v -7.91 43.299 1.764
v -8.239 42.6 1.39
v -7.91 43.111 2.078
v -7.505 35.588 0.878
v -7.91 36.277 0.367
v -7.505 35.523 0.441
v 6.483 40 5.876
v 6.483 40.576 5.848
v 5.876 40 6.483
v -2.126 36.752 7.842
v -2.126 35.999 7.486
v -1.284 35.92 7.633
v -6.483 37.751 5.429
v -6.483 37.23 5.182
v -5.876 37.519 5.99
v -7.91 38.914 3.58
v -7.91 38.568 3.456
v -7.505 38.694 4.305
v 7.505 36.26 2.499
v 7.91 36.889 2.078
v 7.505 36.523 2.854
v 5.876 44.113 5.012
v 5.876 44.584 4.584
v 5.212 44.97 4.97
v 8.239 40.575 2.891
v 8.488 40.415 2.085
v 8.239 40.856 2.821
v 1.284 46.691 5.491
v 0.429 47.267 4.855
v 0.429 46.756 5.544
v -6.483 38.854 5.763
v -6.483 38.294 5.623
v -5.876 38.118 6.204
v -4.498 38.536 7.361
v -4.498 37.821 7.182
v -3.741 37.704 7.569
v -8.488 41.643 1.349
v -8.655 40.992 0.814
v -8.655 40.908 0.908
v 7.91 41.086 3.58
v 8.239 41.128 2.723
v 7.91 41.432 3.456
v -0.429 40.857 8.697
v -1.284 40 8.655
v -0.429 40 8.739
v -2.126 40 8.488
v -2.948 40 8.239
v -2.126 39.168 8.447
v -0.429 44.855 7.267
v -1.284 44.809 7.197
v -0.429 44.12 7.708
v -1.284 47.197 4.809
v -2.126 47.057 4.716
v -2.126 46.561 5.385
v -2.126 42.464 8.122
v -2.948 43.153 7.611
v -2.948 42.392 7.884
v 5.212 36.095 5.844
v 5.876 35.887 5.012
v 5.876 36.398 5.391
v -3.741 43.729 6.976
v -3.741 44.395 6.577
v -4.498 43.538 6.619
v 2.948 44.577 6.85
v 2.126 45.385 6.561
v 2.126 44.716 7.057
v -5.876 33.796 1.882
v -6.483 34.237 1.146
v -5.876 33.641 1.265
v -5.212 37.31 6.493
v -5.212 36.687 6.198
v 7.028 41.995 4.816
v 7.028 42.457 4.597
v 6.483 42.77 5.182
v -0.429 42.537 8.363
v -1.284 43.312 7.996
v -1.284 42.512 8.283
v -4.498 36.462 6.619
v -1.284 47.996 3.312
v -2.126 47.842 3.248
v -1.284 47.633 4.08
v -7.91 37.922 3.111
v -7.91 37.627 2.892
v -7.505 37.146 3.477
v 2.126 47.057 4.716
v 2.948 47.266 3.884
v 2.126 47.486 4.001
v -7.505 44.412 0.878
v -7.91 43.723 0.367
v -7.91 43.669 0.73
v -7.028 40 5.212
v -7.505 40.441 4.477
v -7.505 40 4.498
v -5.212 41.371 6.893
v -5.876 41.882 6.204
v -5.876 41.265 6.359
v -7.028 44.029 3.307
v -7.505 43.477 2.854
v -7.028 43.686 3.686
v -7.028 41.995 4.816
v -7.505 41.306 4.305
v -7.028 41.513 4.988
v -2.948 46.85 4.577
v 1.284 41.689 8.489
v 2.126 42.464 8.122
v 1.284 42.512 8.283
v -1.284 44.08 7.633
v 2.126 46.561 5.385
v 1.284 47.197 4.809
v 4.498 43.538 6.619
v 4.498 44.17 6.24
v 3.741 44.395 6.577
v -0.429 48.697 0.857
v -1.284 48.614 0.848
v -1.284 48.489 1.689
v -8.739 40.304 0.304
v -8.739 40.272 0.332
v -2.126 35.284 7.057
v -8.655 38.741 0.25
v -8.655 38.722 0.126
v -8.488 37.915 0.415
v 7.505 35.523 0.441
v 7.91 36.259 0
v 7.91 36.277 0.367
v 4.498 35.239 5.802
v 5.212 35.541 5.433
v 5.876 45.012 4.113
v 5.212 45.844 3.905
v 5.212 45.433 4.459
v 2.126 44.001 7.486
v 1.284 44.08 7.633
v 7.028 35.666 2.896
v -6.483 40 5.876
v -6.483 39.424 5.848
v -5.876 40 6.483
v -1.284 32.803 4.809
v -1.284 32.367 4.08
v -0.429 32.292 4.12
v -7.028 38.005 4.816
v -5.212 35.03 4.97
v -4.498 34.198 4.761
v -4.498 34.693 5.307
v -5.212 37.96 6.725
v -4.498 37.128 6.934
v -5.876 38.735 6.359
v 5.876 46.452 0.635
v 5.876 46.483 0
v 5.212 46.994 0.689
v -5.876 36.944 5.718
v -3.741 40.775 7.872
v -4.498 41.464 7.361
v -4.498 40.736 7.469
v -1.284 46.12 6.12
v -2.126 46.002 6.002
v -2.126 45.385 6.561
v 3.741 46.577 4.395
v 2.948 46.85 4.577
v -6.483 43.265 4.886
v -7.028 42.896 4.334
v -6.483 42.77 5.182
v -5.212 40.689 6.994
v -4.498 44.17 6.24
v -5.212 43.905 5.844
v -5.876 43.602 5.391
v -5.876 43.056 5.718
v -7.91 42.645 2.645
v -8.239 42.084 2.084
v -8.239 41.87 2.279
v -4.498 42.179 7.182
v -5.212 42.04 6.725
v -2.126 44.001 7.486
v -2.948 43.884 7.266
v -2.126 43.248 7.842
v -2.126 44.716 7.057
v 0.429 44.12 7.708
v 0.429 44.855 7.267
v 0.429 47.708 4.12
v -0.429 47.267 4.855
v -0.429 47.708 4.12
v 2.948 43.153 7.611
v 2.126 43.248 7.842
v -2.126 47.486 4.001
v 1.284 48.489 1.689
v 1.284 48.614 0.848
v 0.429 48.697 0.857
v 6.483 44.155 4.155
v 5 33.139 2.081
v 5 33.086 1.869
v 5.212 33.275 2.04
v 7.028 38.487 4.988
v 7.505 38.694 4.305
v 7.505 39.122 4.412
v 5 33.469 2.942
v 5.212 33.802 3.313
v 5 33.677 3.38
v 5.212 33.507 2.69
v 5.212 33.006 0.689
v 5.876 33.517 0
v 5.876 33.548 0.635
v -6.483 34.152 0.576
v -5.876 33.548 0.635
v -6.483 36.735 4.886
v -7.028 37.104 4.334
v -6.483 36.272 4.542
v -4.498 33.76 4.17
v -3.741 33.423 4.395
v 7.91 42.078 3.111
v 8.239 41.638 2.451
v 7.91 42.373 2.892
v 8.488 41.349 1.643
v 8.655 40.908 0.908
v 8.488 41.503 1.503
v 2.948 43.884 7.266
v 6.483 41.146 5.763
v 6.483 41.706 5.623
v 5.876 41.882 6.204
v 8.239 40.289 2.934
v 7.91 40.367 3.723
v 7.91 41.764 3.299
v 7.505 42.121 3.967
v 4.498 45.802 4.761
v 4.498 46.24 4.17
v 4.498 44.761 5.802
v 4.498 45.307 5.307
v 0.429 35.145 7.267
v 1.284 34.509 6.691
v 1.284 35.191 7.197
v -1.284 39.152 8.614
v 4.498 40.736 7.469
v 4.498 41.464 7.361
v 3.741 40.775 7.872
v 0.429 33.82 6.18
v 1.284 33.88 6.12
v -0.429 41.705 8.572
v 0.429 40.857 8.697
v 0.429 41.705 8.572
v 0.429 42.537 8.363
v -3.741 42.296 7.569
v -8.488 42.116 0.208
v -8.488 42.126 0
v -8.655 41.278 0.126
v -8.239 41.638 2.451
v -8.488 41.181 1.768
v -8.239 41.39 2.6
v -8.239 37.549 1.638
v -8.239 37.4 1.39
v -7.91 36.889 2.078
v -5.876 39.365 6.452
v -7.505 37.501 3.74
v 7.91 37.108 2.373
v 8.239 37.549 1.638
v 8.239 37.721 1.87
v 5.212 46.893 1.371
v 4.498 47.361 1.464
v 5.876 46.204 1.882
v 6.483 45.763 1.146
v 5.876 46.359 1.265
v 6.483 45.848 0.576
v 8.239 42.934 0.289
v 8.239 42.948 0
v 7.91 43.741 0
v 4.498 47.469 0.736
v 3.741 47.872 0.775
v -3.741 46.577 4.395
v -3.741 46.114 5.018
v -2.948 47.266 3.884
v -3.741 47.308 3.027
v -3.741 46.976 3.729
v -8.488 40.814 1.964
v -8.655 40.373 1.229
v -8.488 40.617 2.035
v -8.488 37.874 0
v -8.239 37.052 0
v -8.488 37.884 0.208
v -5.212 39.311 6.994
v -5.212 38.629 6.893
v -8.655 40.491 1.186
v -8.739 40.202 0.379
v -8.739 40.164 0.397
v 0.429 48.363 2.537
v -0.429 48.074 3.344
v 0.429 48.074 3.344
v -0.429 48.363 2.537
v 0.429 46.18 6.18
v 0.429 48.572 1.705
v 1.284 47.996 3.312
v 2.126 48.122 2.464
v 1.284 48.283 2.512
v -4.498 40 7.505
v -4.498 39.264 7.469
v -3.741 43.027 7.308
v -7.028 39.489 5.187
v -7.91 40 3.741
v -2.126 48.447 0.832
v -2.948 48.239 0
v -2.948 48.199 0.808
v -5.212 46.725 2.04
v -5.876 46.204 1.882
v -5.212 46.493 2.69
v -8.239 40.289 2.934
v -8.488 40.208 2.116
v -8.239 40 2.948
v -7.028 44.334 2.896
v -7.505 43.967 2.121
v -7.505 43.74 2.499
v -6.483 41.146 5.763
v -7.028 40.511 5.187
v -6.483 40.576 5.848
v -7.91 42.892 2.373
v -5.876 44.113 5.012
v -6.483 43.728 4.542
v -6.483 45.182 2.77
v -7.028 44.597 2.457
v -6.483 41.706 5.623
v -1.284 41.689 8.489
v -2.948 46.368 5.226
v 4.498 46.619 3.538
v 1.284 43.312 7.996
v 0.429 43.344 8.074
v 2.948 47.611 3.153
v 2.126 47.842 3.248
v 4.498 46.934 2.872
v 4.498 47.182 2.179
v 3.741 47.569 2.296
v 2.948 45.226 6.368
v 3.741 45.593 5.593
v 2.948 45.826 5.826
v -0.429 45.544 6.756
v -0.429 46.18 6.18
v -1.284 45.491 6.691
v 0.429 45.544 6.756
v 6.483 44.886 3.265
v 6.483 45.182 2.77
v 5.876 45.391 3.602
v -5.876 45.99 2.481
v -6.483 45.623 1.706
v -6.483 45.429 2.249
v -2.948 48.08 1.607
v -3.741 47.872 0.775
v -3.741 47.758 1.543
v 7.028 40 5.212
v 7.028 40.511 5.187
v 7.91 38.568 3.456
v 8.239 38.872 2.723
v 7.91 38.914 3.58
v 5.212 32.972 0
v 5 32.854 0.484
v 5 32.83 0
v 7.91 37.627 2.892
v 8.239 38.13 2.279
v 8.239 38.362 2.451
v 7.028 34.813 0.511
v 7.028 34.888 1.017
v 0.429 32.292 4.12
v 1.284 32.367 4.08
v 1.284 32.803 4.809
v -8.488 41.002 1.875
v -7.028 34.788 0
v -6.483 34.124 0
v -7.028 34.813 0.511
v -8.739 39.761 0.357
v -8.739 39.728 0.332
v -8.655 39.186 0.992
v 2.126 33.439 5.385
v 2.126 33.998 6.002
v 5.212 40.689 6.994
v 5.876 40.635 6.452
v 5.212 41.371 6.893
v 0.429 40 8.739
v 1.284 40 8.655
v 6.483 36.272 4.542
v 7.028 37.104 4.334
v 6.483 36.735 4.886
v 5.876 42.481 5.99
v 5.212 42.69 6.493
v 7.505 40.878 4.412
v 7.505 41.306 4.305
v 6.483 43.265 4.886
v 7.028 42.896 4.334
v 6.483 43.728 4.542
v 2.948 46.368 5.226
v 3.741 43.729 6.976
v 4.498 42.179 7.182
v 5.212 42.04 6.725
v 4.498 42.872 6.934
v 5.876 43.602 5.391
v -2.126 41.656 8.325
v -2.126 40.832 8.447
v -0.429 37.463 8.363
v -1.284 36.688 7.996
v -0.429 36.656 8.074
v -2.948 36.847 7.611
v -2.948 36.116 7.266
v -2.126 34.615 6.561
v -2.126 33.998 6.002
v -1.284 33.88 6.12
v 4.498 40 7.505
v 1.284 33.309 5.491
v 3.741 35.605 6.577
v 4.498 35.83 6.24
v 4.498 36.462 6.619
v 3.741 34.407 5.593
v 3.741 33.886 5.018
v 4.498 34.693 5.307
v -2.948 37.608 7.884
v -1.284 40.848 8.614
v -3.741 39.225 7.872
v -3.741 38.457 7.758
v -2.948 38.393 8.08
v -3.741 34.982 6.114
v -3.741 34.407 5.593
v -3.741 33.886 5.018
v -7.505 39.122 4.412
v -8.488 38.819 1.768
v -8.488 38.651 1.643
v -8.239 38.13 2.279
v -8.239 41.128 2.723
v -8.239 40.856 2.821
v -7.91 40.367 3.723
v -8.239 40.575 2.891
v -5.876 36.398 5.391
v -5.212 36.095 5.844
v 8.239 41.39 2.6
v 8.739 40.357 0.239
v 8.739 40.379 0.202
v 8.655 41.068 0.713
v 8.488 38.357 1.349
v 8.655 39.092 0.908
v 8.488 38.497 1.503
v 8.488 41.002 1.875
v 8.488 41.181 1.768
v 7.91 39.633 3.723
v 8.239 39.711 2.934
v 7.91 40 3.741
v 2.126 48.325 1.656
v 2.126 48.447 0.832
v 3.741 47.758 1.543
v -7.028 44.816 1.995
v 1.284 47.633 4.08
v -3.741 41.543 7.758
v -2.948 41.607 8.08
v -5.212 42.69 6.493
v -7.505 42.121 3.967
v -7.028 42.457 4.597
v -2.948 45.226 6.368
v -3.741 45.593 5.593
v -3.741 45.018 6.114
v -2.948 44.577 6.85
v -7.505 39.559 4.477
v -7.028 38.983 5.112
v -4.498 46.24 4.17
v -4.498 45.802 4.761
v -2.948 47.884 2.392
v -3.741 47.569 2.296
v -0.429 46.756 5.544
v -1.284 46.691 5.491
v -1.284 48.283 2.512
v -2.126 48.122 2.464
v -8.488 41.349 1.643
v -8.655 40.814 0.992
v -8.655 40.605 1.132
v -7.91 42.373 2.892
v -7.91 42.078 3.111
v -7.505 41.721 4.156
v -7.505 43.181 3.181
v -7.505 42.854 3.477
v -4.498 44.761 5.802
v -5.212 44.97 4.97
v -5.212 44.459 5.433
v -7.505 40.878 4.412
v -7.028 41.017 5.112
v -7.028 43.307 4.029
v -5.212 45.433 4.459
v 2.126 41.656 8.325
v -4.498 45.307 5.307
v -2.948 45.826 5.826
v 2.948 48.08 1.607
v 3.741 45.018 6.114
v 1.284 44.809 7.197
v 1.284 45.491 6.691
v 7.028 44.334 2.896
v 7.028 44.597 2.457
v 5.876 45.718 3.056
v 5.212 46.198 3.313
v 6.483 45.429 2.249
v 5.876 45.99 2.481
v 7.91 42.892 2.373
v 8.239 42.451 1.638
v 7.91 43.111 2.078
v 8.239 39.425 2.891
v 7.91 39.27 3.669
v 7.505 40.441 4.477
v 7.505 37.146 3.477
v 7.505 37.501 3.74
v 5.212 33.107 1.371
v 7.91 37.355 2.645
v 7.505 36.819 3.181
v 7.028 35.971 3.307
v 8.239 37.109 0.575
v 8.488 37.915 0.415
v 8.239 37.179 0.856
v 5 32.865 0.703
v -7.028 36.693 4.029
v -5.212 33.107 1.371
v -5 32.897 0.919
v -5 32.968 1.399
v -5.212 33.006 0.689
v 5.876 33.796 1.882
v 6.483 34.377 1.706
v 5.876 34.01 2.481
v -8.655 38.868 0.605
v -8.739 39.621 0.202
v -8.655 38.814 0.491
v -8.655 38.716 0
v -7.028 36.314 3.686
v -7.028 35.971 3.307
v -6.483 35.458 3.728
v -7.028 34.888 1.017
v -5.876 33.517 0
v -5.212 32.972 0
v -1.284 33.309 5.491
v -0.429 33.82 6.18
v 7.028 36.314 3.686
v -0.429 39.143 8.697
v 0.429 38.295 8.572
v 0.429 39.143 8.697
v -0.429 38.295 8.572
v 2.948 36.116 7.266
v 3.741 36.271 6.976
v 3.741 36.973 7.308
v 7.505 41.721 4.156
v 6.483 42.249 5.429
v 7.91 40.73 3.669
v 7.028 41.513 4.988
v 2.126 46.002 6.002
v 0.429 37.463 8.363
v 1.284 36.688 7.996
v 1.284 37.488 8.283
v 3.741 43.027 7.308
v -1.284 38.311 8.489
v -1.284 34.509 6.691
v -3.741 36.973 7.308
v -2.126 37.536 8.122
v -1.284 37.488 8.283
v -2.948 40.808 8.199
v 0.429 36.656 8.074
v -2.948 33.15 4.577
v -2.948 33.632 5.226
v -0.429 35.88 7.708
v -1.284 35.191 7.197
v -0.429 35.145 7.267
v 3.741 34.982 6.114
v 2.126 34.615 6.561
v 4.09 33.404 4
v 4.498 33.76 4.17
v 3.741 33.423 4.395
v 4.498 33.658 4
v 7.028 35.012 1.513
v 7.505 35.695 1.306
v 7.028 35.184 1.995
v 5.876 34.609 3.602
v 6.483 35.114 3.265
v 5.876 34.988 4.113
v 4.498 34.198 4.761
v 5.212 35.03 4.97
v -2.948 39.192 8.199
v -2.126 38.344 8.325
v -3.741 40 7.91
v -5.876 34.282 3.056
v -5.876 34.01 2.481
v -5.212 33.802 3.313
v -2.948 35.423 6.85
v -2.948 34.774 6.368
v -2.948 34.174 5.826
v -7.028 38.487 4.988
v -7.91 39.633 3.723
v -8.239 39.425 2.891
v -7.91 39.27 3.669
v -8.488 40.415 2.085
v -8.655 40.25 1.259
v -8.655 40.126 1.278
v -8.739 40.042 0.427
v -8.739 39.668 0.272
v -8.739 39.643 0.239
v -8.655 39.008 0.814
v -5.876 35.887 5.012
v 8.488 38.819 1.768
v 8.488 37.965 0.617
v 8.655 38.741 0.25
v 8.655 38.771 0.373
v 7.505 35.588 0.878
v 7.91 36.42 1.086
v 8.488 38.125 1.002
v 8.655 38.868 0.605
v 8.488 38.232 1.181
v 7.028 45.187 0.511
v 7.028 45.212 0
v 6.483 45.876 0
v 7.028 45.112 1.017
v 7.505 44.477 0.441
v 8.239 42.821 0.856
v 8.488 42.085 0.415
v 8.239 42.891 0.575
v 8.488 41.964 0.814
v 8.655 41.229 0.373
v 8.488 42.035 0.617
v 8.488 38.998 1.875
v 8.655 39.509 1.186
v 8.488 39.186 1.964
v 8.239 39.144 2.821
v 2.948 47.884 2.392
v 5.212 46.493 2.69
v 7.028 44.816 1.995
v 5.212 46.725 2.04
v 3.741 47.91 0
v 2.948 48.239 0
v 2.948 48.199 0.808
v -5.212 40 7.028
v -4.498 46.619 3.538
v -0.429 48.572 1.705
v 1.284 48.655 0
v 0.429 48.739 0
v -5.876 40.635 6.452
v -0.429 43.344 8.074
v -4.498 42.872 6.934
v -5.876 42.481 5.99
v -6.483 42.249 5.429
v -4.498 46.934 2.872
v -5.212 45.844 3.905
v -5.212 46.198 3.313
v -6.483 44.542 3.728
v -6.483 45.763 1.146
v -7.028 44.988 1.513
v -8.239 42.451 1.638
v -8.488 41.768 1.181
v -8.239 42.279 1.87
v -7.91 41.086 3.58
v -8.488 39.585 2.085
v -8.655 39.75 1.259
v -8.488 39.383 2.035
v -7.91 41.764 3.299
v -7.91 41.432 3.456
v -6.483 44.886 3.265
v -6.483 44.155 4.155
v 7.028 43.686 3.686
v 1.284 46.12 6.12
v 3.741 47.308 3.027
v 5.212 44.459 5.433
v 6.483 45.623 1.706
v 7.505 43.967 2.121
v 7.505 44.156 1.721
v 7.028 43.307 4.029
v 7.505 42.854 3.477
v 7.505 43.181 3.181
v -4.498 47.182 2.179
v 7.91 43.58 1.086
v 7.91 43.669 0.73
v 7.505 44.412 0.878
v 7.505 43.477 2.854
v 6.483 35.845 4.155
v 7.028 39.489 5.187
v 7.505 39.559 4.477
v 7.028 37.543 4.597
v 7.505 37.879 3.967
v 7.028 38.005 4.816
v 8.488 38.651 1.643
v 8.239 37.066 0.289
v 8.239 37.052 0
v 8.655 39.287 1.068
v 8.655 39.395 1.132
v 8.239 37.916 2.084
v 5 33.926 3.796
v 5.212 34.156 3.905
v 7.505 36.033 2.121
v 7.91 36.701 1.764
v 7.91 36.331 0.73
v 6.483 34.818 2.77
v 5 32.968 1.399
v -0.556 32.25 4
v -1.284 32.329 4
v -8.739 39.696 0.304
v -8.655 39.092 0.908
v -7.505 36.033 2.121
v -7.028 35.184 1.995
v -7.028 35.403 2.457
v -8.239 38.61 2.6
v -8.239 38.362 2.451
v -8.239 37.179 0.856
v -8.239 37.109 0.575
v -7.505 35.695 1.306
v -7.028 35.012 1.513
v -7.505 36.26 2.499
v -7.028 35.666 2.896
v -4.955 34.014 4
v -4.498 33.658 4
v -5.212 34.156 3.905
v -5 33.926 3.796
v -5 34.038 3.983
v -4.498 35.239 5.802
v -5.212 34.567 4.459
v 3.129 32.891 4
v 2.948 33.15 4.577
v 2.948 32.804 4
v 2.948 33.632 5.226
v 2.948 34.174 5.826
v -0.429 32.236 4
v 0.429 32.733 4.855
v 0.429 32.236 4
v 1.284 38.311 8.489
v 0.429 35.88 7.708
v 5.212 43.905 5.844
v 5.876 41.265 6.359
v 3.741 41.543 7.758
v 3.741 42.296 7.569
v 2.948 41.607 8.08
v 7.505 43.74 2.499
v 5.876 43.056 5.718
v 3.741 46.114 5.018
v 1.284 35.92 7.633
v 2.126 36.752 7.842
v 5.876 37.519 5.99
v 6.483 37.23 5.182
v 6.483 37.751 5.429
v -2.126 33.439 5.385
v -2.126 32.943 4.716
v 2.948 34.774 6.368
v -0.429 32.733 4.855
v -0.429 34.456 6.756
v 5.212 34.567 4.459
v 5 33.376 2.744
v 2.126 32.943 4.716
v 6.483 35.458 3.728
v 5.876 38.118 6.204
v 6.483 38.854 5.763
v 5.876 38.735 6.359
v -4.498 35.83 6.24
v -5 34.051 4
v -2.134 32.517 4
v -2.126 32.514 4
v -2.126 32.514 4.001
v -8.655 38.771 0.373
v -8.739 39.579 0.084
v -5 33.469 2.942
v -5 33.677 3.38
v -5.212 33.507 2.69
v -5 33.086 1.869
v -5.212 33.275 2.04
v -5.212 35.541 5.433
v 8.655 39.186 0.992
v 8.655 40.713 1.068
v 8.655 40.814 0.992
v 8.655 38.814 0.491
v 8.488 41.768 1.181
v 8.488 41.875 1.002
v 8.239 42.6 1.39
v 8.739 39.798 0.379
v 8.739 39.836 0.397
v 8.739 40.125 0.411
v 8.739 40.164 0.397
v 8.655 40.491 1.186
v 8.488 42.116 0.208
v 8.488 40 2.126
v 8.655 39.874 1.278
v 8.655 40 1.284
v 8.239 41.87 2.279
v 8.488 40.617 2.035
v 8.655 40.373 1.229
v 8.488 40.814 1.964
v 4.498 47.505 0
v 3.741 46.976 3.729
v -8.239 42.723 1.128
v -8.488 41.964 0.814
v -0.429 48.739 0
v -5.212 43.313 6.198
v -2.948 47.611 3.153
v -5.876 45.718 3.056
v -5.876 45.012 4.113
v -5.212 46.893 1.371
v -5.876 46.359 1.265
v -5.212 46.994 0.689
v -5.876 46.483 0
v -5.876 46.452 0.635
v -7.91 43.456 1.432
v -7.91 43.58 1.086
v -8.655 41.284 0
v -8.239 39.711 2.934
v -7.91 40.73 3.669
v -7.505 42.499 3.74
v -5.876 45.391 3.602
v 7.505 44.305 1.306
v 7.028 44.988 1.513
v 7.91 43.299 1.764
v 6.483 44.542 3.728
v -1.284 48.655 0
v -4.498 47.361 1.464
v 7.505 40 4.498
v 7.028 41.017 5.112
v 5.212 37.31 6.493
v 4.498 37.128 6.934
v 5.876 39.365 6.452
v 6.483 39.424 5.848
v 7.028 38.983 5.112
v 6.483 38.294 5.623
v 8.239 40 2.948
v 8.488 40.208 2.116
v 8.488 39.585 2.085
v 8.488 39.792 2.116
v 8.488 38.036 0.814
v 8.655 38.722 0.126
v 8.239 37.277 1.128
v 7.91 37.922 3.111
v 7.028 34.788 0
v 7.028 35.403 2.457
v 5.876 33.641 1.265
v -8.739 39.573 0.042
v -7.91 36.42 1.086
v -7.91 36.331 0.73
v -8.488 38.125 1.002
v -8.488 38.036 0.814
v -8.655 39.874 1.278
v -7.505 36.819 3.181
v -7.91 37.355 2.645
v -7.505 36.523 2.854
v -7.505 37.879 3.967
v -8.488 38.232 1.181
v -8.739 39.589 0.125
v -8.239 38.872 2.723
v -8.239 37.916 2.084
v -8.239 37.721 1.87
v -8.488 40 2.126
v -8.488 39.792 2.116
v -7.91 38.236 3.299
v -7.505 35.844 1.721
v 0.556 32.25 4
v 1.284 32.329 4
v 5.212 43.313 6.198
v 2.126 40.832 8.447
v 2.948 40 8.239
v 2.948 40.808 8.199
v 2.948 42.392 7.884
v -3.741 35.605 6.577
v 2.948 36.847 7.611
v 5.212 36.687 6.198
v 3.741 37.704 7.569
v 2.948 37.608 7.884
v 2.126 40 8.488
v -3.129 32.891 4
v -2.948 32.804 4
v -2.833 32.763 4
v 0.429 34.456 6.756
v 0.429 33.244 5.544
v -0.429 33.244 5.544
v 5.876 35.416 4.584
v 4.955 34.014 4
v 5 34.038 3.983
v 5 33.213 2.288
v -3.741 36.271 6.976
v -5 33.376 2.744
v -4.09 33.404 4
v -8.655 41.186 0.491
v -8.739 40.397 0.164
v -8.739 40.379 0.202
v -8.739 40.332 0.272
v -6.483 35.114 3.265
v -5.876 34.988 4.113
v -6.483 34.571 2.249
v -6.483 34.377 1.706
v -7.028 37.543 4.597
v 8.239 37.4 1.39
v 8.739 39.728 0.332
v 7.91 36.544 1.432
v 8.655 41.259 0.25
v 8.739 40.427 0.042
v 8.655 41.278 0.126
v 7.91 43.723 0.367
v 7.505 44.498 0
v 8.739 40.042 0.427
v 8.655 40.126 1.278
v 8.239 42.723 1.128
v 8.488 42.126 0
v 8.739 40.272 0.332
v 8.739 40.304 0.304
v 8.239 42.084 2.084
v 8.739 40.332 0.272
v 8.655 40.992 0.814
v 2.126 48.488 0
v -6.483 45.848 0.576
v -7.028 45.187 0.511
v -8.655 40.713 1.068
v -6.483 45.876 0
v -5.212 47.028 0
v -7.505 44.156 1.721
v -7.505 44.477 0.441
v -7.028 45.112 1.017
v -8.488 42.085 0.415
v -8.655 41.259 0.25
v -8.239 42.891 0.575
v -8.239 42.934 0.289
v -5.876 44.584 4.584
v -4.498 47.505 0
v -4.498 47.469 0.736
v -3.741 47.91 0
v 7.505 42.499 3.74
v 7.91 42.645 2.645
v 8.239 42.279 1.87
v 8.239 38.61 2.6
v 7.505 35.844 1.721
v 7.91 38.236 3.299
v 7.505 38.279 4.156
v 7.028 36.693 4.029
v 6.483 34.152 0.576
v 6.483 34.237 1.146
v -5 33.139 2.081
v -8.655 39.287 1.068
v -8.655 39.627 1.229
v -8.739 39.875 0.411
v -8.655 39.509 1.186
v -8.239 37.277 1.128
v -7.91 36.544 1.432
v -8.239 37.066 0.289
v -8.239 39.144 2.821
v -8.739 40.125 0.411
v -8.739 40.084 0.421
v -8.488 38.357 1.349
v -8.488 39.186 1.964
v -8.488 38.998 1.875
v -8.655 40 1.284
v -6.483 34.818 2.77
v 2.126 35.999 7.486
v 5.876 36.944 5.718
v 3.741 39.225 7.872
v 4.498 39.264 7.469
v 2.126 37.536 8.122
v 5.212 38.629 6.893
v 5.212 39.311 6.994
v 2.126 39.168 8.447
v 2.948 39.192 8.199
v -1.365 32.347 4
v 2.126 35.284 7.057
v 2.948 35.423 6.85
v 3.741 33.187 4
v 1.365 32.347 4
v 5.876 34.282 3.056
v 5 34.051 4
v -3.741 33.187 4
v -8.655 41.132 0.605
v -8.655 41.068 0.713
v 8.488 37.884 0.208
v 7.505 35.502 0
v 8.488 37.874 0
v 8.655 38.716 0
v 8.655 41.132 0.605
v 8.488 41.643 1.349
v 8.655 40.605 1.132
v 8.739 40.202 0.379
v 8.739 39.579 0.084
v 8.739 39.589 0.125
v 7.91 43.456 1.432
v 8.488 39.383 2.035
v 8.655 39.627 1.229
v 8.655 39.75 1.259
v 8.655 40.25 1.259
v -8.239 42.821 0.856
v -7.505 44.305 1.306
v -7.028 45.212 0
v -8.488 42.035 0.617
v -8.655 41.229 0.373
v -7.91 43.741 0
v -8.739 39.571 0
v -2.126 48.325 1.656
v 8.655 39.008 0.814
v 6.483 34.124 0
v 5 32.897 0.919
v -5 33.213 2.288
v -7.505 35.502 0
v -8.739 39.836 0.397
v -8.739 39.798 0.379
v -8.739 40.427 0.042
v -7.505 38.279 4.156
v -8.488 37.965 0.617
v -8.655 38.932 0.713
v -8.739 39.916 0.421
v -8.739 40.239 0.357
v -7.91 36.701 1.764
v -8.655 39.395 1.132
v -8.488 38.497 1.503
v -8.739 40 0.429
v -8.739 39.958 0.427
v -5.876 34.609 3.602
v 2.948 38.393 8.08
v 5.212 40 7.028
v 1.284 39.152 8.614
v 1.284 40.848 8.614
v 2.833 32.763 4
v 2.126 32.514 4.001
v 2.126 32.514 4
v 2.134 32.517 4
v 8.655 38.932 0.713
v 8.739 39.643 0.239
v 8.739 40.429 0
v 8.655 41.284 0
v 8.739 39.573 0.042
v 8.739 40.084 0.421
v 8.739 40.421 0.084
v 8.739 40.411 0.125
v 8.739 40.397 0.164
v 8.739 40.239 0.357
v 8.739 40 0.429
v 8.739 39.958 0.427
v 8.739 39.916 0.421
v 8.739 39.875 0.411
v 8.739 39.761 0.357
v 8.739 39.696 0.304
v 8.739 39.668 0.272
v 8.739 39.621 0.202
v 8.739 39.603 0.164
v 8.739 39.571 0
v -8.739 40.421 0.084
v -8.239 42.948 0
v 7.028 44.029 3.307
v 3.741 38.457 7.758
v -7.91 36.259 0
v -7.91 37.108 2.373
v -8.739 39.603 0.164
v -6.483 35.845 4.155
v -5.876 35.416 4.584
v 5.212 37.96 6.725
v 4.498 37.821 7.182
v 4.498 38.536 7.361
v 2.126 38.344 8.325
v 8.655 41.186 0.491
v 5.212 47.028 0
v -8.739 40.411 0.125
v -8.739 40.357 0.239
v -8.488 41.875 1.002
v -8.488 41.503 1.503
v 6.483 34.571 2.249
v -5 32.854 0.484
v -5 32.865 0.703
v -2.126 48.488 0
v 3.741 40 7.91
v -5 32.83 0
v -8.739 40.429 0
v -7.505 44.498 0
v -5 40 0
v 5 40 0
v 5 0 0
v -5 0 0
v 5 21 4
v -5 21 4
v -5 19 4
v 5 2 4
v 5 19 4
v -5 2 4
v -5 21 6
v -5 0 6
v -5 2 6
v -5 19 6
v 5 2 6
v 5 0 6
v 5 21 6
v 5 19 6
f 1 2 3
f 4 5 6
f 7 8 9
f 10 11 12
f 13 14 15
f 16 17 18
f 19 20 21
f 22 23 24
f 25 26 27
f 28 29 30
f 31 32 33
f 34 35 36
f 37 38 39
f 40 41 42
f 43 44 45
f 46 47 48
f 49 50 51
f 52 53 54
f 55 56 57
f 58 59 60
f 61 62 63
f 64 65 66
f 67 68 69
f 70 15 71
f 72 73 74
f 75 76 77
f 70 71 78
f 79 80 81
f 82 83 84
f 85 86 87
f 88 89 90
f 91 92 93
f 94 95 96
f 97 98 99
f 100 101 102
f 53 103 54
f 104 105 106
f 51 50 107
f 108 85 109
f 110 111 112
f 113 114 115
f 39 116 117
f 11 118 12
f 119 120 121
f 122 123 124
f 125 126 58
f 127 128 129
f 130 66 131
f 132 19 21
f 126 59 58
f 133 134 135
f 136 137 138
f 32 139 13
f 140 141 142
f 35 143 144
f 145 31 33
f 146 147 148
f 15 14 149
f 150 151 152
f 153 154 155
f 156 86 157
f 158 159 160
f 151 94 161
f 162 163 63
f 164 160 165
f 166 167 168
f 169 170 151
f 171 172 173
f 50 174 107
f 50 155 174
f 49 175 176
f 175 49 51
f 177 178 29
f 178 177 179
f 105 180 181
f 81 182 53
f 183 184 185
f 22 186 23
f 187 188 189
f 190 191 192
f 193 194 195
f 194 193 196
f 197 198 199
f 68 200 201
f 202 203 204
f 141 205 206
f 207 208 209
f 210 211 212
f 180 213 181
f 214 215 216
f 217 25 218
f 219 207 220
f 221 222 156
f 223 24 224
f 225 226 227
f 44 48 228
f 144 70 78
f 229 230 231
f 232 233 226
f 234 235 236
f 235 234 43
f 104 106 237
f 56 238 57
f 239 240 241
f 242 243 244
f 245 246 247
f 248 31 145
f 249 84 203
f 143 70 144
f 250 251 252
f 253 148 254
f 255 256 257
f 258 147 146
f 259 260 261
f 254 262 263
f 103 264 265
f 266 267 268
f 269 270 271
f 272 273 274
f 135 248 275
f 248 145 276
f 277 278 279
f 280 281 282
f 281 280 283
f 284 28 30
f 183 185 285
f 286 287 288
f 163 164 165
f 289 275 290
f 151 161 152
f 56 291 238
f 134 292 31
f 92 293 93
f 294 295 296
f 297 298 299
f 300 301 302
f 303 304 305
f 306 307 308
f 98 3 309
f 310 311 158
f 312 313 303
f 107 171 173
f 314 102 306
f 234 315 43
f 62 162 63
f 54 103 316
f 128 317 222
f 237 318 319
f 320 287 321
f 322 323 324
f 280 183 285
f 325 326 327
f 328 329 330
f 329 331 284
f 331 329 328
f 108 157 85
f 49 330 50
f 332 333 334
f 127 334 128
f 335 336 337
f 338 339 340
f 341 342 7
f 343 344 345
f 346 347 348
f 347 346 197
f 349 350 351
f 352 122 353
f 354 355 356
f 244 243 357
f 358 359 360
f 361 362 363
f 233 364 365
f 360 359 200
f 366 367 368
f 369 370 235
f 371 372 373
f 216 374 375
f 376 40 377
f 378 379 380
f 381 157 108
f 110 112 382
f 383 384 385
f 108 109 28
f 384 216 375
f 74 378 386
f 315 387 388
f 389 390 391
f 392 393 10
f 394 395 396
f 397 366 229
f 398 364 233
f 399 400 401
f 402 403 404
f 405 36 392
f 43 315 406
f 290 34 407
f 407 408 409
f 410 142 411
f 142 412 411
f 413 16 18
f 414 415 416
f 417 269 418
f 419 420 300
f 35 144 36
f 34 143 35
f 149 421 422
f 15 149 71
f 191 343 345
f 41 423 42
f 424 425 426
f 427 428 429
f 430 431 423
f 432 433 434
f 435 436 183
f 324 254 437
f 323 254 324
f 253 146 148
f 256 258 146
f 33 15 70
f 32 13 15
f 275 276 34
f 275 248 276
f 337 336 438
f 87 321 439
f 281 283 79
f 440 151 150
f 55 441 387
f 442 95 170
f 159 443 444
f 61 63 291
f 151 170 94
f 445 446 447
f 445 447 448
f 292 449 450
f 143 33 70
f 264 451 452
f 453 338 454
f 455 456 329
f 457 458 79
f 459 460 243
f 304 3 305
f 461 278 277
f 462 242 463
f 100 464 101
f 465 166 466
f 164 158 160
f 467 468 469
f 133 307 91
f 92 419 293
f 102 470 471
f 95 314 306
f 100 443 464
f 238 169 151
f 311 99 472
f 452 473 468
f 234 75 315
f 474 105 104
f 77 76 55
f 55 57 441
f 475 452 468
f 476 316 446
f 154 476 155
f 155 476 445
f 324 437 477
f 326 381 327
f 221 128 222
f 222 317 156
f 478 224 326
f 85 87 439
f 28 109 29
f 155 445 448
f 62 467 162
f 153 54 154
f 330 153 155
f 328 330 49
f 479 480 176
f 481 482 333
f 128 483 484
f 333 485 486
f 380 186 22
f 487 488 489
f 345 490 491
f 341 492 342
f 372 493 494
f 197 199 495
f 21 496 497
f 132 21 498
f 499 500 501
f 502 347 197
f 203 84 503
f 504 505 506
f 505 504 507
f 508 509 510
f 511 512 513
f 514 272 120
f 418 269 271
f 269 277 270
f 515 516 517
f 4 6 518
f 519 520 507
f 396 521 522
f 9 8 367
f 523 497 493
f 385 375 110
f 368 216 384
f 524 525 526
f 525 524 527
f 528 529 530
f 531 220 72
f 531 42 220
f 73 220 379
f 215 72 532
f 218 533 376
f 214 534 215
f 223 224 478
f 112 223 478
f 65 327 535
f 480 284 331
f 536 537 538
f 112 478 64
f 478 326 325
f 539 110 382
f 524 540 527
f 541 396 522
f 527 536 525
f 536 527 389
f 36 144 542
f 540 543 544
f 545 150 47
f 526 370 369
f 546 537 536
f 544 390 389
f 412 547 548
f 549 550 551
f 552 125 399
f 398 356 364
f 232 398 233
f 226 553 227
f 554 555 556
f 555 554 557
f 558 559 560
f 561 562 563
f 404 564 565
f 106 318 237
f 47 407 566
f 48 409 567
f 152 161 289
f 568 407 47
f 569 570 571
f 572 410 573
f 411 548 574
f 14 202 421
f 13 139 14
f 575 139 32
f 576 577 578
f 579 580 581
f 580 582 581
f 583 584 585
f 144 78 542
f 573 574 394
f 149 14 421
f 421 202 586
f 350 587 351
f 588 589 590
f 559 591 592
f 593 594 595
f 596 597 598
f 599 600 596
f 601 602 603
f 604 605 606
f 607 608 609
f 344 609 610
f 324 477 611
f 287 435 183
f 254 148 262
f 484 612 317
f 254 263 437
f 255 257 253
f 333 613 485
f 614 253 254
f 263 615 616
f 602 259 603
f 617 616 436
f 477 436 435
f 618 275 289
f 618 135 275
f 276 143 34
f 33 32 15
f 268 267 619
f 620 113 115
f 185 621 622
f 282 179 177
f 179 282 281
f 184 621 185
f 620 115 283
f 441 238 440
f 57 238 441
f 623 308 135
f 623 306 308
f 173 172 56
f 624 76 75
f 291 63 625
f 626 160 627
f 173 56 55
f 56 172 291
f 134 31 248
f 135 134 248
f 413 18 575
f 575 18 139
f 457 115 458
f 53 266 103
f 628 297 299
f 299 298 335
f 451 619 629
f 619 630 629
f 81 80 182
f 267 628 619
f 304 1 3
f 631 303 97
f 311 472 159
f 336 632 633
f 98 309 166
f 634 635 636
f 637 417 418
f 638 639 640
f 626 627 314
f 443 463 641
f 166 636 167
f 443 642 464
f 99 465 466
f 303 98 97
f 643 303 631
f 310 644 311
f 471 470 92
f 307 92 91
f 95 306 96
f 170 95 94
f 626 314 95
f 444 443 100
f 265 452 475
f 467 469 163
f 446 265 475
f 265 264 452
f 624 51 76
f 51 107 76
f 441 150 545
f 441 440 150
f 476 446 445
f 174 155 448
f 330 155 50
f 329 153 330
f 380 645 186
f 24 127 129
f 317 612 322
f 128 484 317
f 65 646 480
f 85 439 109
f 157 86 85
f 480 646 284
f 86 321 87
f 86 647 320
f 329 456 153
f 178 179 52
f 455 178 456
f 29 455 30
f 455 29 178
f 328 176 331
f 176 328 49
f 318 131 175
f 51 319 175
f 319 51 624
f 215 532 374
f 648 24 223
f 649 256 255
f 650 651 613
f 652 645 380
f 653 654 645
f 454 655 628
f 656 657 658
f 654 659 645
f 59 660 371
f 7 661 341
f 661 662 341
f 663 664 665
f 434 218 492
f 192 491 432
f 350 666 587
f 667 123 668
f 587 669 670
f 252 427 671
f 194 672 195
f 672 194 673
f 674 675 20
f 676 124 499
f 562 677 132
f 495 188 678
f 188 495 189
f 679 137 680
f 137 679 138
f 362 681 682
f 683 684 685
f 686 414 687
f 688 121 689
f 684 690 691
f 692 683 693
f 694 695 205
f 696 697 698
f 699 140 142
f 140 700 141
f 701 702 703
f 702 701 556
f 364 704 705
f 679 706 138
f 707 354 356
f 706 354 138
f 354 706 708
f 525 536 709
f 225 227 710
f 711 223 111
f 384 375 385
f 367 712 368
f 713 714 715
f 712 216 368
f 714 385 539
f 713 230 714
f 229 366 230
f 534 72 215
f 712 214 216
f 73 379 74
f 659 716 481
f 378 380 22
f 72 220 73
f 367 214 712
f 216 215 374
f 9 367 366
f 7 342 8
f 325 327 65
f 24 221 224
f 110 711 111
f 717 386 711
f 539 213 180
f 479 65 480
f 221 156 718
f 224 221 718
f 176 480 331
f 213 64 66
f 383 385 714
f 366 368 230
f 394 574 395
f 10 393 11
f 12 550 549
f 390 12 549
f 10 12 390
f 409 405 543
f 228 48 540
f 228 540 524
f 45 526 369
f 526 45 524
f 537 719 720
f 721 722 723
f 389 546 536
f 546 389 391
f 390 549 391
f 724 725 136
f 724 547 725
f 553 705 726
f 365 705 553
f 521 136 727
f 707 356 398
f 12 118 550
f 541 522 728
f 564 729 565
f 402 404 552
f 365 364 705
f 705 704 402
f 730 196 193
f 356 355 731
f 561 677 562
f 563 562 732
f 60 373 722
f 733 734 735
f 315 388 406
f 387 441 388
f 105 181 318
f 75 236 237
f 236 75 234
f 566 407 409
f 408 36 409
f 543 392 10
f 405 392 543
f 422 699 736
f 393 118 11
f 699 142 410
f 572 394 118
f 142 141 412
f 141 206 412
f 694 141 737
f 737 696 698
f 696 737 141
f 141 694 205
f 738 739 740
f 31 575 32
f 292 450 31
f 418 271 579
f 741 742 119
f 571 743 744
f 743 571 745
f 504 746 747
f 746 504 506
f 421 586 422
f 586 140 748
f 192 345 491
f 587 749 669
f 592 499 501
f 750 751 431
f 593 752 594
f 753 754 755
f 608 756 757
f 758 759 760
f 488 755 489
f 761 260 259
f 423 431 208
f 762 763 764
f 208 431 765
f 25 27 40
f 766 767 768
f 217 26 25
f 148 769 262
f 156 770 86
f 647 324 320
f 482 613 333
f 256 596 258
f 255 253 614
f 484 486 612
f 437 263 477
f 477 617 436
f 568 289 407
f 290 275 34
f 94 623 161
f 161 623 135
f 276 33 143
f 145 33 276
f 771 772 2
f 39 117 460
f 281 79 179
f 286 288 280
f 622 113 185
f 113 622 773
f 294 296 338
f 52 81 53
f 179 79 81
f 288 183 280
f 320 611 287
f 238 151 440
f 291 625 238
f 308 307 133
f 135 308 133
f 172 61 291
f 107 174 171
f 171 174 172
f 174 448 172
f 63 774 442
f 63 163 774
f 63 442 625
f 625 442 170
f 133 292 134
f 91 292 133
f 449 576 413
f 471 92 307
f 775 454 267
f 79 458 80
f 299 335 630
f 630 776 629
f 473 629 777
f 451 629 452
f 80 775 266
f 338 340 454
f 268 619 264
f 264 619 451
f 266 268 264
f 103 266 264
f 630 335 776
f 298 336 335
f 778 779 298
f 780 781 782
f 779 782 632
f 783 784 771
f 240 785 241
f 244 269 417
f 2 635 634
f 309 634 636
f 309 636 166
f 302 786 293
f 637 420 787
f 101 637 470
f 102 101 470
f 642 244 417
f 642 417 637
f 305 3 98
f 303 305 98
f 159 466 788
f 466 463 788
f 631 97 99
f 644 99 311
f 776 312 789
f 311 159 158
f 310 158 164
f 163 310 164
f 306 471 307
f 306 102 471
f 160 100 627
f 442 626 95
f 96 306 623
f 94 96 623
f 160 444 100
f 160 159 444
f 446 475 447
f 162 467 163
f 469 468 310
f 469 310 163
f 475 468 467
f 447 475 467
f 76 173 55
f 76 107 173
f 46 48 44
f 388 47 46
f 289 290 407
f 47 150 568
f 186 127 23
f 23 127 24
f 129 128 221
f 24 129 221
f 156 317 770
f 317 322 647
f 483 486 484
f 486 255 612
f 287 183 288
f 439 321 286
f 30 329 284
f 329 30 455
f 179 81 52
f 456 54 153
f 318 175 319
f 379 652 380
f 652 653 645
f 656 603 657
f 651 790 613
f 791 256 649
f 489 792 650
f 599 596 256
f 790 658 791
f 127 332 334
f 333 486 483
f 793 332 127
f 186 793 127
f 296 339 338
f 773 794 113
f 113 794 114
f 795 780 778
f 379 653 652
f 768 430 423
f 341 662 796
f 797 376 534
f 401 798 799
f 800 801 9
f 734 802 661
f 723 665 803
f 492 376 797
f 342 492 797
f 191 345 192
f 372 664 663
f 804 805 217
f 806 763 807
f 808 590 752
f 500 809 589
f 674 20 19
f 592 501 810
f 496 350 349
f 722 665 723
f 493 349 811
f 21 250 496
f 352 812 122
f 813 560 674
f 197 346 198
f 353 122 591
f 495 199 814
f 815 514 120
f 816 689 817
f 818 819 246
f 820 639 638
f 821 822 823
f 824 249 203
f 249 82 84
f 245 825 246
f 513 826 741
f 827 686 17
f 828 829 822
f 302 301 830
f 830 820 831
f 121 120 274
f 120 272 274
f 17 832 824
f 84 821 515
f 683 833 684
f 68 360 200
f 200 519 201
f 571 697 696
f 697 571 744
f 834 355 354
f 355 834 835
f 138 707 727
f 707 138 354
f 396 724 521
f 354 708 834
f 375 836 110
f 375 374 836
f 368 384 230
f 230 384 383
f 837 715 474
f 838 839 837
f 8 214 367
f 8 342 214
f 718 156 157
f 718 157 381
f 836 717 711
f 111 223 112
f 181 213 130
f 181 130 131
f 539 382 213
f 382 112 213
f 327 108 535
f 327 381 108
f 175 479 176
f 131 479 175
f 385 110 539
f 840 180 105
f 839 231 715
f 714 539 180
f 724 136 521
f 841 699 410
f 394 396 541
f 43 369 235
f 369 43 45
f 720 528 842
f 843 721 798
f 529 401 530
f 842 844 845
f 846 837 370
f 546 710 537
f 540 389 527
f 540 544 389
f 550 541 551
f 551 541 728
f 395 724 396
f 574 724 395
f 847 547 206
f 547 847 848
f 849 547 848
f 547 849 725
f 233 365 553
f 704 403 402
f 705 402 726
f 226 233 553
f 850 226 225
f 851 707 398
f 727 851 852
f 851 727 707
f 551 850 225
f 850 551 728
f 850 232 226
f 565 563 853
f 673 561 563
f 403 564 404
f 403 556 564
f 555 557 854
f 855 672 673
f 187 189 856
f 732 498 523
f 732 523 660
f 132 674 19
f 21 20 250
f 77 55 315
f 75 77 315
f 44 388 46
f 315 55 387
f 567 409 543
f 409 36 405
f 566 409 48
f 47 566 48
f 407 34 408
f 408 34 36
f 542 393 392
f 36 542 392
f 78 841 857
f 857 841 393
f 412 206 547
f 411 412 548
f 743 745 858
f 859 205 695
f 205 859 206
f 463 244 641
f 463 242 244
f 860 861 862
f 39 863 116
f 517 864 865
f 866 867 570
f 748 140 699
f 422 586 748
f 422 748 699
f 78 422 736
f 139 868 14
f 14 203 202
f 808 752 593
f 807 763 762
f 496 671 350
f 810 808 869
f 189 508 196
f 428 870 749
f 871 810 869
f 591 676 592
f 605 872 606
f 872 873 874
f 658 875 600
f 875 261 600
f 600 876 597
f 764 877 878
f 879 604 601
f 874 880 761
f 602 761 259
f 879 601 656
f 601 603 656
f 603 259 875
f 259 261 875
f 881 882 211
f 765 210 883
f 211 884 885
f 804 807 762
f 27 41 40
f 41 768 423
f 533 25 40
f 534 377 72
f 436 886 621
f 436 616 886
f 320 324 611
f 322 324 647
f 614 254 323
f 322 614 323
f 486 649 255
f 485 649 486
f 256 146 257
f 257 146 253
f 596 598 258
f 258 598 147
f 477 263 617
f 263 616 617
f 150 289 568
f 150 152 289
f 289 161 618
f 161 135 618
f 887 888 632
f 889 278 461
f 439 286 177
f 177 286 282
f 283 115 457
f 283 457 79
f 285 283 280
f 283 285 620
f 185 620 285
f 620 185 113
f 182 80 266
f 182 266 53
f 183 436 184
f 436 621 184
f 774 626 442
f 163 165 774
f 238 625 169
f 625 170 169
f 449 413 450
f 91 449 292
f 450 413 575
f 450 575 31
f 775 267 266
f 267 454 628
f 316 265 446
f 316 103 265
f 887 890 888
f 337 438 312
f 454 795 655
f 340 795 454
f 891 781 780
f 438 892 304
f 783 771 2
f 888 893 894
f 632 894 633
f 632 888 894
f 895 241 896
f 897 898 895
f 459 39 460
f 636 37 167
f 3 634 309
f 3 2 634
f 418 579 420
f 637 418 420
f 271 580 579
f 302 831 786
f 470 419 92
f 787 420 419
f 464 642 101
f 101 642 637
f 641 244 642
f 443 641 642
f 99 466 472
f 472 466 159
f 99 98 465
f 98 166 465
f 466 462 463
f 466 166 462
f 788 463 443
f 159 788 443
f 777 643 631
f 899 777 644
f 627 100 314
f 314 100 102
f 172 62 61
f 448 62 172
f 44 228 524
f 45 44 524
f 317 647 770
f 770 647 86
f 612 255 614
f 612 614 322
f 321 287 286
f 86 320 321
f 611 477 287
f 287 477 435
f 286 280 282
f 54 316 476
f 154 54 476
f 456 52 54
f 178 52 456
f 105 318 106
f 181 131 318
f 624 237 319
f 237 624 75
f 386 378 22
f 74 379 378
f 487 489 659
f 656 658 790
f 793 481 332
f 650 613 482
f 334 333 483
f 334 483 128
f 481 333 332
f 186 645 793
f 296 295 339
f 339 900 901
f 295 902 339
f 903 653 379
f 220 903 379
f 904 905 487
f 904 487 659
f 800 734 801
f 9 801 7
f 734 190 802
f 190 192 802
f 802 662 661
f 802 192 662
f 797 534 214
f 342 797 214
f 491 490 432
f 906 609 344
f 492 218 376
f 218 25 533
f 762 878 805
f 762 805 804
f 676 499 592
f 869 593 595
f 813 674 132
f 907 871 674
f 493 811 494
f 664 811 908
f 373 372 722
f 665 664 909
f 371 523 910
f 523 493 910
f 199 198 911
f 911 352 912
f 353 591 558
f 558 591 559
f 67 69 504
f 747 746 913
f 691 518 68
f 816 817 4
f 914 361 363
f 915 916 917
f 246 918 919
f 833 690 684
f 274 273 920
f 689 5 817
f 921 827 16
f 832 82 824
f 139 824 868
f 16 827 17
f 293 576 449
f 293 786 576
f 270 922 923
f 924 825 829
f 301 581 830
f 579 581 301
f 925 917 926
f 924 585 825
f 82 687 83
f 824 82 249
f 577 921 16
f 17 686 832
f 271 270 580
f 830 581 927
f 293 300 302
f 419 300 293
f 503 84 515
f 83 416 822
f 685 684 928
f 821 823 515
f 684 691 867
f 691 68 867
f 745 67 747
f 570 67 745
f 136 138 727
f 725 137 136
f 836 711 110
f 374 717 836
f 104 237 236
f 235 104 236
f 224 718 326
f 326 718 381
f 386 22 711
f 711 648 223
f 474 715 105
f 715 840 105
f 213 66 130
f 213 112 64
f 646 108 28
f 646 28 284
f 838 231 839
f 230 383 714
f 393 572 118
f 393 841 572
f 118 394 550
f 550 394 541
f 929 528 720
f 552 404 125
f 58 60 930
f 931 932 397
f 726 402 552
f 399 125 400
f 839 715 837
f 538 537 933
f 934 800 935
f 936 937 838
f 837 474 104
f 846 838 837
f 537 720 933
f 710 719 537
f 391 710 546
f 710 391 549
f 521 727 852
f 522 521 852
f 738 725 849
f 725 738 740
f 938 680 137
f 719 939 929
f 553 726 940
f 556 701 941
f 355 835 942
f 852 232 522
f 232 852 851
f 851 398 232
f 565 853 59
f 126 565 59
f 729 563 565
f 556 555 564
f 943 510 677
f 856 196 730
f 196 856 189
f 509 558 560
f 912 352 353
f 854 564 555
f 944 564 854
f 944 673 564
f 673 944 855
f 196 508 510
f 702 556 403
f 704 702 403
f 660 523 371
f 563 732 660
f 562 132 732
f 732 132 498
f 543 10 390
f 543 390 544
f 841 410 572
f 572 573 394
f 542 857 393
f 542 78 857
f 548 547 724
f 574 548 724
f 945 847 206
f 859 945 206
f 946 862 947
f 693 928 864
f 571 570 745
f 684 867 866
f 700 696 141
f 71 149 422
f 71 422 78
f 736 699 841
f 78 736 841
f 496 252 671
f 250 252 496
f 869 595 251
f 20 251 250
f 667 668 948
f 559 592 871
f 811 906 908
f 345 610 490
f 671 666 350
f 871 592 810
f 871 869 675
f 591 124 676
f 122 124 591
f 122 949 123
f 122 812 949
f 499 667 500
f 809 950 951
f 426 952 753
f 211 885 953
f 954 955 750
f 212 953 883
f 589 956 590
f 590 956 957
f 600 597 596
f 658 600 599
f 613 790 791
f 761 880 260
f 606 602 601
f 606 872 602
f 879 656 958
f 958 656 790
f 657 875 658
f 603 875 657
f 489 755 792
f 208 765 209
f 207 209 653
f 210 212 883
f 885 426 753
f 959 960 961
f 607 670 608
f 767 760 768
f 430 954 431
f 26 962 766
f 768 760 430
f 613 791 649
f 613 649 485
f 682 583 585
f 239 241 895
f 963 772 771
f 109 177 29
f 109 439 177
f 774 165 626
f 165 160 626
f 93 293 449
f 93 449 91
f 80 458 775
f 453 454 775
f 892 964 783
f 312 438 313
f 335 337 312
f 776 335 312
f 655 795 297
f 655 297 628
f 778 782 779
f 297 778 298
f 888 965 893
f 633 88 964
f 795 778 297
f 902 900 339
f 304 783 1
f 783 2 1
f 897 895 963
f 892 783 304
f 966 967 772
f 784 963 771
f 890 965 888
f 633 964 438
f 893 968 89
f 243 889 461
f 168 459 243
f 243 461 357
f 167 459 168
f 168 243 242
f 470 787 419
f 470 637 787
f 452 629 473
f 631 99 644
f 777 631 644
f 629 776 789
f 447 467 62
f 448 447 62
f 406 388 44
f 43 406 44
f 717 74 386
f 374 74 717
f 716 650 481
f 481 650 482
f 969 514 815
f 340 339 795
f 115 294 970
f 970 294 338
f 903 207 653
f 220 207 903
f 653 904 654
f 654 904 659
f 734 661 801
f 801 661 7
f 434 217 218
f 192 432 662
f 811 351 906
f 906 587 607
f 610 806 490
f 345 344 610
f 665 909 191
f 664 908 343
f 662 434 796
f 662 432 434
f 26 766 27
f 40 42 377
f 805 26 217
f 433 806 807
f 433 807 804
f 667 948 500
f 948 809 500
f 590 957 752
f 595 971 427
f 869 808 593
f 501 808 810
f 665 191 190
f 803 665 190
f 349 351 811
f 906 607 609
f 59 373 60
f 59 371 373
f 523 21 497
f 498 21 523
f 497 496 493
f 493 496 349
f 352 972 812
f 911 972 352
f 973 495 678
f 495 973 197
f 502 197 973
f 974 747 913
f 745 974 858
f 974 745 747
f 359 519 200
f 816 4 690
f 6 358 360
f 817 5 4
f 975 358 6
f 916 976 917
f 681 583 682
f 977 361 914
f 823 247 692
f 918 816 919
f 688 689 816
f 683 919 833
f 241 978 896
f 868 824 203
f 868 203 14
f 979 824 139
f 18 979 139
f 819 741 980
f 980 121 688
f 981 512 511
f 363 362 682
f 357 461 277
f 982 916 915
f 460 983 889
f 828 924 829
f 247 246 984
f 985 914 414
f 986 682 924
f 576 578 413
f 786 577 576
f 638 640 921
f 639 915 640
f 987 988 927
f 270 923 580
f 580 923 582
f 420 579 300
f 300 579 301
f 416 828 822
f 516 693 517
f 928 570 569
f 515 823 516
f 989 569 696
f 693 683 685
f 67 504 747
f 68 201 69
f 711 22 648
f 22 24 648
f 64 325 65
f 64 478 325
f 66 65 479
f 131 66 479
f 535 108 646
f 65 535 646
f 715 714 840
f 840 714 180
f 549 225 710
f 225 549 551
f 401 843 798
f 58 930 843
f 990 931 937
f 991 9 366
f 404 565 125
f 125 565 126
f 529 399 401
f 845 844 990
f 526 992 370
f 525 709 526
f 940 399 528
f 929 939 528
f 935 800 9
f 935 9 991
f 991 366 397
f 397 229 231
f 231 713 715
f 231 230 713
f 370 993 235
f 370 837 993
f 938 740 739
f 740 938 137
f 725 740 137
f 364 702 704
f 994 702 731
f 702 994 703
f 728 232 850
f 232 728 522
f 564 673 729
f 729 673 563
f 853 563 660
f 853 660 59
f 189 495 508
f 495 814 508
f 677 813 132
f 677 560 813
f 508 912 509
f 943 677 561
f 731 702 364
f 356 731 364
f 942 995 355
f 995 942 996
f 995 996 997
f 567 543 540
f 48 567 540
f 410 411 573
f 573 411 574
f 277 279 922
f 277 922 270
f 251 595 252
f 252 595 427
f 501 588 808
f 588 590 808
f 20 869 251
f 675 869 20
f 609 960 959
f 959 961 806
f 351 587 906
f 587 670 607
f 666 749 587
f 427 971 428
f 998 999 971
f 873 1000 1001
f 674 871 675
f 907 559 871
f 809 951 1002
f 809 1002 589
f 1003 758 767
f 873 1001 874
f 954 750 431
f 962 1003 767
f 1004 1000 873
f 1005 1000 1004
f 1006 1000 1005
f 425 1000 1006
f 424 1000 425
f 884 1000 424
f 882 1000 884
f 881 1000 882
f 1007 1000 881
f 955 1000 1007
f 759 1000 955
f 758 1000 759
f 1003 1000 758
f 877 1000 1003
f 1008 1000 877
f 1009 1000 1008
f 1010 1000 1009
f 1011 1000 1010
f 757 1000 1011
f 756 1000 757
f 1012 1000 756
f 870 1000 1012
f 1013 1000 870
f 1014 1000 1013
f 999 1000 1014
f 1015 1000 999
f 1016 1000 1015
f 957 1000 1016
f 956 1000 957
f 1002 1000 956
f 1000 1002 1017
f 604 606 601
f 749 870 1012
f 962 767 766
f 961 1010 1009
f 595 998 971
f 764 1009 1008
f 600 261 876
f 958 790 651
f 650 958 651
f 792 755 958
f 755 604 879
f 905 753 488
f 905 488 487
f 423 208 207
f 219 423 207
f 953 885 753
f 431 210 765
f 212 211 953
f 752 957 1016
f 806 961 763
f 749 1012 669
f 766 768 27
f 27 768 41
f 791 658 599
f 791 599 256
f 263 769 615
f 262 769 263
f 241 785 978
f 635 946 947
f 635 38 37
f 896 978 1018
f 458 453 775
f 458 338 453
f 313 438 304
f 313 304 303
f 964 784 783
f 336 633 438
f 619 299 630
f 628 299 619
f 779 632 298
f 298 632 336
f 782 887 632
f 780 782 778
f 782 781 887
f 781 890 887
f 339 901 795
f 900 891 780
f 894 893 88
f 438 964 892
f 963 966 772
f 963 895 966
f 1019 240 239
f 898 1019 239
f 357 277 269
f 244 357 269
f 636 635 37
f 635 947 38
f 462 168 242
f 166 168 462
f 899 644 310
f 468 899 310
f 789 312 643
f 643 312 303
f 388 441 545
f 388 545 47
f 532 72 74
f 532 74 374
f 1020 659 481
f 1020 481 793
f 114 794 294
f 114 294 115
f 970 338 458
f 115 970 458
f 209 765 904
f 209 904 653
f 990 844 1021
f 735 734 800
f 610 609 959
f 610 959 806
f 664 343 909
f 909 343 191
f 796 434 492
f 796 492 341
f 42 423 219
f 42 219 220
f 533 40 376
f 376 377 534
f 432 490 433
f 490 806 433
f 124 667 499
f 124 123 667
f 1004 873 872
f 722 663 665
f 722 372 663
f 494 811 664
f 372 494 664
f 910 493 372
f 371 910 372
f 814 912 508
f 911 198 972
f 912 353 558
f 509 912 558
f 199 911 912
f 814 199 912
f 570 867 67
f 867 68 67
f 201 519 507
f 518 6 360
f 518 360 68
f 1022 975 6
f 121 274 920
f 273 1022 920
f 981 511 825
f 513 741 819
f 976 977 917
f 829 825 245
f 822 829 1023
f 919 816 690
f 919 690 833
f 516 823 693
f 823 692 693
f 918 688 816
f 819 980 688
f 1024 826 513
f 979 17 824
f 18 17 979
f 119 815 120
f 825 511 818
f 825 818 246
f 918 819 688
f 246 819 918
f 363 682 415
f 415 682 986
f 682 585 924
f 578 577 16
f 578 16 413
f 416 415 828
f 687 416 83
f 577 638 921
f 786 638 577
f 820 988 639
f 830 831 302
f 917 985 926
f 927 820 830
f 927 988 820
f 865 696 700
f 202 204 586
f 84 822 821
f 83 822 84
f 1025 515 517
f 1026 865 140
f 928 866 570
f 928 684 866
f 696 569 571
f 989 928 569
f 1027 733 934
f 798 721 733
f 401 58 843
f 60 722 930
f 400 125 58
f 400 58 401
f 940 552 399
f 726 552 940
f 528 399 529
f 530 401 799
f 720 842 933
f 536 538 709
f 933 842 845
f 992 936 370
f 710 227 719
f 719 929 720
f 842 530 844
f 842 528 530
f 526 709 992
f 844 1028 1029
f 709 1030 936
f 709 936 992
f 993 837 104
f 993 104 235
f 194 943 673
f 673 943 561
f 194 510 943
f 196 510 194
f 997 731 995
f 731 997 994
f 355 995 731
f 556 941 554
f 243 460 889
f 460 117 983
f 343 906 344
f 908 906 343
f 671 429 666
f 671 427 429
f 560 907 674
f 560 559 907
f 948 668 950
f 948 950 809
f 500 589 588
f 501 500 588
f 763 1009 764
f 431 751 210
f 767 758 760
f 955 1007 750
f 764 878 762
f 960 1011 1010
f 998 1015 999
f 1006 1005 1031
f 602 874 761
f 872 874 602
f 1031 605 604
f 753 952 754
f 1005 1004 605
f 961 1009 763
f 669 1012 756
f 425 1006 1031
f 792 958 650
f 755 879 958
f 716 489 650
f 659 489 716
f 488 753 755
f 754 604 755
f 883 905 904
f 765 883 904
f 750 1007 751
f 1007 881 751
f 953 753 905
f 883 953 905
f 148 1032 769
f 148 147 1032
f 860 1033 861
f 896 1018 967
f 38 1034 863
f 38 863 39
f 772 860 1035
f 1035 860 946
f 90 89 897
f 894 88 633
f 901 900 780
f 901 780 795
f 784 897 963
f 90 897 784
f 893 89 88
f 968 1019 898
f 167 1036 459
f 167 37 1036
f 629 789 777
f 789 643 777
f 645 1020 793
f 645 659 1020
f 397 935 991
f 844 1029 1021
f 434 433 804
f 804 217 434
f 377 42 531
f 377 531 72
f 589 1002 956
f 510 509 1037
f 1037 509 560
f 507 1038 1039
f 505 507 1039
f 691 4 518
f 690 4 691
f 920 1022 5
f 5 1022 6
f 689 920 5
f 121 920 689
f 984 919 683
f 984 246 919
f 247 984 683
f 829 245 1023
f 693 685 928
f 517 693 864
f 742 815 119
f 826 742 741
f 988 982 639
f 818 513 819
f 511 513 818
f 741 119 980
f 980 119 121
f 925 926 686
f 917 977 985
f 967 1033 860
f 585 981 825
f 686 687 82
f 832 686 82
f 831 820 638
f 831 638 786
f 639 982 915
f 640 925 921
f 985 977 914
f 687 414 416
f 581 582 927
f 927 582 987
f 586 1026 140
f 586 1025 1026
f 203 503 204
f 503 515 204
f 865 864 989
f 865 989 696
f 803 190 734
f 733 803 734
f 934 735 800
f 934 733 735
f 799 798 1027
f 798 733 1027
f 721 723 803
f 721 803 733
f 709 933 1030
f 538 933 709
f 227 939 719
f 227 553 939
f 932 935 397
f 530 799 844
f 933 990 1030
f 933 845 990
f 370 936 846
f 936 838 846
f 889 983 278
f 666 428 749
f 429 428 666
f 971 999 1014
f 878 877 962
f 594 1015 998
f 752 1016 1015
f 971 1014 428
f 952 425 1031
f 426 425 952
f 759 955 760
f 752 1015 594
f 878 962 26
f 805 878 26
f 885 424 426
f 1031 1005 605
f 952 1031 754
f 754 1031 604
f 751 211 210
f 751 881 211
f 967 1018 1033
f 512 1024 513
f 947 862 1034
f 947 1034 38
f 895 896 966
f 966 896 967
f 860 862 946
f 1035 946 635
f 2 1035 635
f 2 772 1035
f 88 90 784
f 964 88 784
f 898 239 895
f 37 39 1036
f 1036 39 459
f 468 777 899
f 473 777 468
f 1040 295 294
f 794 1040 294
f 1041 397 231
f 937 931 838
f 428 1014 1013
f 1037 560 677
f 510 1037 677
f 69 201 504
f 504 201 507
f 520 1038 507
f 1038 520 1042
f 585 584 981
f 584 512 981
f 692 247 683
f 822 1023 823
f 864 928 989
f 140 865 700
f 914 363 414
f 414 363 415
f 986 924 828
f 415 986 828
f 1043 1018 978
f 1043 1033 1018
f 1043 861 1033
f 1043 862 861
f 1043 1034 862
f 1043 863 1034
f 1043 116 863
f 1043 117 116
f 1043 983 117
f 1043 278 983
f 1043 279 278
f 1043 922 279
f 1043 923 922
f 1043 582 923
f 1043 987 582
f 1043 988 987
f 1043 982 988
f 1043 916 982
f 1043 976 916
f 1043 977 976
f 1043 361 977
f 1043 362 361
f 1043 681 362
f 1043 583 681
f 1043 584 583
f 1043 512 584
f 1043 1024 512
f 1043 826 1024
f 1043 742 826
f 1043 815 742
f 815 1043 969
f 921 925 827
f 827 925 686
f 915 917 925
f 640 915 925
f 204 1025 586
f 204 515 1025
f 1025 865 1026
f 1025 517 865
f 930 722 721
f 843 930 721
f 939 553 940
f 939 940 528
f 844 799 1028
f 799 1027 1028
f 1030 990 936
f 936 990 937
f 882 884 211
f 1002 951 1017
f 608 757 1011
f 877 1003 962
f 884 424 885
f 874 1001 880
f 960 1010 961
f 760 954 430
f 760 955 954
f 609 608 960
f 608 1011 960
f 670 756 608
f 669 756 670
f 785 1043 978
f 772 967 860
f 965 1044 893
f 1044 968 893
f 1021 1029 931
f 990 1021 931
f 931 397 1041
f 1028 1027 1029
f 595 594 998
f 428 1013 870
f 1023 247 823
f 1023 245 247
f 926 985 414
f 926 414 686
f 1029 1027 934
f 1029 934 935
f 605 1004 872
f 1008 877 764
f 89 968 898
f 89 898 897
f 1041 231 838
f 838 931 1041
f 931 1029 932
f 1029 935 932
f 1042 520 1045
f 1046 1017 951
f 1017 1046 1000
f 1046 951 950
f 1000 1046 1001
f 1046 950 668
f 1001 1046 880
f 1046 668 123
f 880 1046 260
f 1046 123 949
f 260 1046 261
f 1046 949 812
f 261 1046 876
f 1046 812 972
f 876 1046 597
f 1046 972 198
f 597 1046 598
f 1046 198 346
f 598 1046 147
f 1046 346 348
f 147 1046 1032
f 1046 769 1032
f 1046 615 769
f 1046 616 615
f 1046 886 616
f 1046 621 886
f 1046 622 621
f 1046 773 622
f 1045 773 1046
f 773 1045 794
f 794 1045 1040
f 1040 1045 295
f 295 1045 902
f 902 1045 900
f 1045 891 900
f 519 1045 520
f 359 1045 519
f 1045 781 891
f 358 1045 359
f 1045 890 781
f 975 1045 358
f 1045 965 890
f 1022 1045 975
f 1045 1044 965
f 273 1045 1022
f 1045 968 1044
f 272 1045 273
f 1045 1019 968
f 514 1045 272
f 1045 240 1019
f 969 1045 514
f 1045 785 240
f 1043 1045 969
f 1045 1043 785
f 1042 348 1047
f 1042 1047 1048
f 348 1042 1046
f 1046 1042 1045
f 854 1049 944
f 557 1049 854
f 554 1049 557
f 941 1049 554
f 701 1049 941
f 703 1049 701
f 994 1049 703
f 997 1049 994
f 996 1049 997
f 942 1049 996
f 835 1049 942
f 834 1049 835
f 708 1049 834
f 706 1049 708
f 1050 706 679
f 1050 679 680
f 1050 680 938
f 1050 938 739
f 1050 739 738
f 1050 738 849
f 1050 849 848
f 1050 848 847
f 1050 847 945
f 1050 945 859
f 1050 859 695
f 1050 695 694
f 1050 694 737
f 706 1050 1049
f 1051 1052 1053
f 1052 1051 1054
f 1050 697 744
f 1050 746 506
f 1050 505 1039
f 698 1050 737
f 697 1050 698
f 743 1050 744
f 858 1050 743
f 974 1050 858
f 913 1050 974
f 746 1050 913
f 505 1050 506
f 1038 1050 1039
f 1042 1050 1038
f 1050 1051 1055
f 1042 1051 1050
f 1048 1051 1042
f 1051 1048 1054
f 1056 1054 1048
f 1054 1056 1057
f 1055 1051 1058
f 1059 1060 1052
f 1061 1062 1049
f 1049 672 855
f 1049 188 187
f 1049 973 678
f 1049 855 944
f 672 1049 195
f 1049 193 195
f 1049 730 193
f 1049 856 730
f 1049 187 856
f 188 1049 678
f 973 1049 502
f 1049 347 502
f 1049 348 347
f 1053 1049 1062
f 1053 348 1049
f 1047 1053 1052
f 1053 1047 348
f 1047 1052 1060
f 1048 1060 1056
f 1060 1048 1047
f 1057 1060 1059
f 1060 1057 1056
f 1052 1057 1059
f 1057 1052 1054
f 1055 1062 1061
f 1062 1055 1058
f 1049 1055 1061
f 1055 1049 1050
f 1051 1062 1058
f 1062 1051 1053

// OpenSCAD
$fn= $preview ? 32 : 64;

sph=17.5;

pin_x=4;
pin_y=40;
pin_z=10;

holder=2;
holder_space=17;

module triangle(x, y, z) {
    polyhedron(
        points=[[0,0,0],[x,0,0],[x,y,0],[0,y,0],[0,y,z],[x,y,z]],
        faces=[[0,1,2,3],[5,4,3,2],[0,4,5,1],[0,3,4],[5,2,1]]
    );
}

rotate([0,-90,0]) {
	translate([0,pin_y,0]) difference() {
		sphere(d=sph);
		translate([-sph/4,0,0]) cube([sph/2,sph,sph], center=true);
	}

	translate([0,0,-pin_z/2]) {
		cube([pin_x,pin_y,pin_z]);
		cube([pin_x+holder,holder,pin_z]);
		translate([0,holder_space+holder,0]) cube([pin_x+holder,holder,pin_z]);
	}
}
